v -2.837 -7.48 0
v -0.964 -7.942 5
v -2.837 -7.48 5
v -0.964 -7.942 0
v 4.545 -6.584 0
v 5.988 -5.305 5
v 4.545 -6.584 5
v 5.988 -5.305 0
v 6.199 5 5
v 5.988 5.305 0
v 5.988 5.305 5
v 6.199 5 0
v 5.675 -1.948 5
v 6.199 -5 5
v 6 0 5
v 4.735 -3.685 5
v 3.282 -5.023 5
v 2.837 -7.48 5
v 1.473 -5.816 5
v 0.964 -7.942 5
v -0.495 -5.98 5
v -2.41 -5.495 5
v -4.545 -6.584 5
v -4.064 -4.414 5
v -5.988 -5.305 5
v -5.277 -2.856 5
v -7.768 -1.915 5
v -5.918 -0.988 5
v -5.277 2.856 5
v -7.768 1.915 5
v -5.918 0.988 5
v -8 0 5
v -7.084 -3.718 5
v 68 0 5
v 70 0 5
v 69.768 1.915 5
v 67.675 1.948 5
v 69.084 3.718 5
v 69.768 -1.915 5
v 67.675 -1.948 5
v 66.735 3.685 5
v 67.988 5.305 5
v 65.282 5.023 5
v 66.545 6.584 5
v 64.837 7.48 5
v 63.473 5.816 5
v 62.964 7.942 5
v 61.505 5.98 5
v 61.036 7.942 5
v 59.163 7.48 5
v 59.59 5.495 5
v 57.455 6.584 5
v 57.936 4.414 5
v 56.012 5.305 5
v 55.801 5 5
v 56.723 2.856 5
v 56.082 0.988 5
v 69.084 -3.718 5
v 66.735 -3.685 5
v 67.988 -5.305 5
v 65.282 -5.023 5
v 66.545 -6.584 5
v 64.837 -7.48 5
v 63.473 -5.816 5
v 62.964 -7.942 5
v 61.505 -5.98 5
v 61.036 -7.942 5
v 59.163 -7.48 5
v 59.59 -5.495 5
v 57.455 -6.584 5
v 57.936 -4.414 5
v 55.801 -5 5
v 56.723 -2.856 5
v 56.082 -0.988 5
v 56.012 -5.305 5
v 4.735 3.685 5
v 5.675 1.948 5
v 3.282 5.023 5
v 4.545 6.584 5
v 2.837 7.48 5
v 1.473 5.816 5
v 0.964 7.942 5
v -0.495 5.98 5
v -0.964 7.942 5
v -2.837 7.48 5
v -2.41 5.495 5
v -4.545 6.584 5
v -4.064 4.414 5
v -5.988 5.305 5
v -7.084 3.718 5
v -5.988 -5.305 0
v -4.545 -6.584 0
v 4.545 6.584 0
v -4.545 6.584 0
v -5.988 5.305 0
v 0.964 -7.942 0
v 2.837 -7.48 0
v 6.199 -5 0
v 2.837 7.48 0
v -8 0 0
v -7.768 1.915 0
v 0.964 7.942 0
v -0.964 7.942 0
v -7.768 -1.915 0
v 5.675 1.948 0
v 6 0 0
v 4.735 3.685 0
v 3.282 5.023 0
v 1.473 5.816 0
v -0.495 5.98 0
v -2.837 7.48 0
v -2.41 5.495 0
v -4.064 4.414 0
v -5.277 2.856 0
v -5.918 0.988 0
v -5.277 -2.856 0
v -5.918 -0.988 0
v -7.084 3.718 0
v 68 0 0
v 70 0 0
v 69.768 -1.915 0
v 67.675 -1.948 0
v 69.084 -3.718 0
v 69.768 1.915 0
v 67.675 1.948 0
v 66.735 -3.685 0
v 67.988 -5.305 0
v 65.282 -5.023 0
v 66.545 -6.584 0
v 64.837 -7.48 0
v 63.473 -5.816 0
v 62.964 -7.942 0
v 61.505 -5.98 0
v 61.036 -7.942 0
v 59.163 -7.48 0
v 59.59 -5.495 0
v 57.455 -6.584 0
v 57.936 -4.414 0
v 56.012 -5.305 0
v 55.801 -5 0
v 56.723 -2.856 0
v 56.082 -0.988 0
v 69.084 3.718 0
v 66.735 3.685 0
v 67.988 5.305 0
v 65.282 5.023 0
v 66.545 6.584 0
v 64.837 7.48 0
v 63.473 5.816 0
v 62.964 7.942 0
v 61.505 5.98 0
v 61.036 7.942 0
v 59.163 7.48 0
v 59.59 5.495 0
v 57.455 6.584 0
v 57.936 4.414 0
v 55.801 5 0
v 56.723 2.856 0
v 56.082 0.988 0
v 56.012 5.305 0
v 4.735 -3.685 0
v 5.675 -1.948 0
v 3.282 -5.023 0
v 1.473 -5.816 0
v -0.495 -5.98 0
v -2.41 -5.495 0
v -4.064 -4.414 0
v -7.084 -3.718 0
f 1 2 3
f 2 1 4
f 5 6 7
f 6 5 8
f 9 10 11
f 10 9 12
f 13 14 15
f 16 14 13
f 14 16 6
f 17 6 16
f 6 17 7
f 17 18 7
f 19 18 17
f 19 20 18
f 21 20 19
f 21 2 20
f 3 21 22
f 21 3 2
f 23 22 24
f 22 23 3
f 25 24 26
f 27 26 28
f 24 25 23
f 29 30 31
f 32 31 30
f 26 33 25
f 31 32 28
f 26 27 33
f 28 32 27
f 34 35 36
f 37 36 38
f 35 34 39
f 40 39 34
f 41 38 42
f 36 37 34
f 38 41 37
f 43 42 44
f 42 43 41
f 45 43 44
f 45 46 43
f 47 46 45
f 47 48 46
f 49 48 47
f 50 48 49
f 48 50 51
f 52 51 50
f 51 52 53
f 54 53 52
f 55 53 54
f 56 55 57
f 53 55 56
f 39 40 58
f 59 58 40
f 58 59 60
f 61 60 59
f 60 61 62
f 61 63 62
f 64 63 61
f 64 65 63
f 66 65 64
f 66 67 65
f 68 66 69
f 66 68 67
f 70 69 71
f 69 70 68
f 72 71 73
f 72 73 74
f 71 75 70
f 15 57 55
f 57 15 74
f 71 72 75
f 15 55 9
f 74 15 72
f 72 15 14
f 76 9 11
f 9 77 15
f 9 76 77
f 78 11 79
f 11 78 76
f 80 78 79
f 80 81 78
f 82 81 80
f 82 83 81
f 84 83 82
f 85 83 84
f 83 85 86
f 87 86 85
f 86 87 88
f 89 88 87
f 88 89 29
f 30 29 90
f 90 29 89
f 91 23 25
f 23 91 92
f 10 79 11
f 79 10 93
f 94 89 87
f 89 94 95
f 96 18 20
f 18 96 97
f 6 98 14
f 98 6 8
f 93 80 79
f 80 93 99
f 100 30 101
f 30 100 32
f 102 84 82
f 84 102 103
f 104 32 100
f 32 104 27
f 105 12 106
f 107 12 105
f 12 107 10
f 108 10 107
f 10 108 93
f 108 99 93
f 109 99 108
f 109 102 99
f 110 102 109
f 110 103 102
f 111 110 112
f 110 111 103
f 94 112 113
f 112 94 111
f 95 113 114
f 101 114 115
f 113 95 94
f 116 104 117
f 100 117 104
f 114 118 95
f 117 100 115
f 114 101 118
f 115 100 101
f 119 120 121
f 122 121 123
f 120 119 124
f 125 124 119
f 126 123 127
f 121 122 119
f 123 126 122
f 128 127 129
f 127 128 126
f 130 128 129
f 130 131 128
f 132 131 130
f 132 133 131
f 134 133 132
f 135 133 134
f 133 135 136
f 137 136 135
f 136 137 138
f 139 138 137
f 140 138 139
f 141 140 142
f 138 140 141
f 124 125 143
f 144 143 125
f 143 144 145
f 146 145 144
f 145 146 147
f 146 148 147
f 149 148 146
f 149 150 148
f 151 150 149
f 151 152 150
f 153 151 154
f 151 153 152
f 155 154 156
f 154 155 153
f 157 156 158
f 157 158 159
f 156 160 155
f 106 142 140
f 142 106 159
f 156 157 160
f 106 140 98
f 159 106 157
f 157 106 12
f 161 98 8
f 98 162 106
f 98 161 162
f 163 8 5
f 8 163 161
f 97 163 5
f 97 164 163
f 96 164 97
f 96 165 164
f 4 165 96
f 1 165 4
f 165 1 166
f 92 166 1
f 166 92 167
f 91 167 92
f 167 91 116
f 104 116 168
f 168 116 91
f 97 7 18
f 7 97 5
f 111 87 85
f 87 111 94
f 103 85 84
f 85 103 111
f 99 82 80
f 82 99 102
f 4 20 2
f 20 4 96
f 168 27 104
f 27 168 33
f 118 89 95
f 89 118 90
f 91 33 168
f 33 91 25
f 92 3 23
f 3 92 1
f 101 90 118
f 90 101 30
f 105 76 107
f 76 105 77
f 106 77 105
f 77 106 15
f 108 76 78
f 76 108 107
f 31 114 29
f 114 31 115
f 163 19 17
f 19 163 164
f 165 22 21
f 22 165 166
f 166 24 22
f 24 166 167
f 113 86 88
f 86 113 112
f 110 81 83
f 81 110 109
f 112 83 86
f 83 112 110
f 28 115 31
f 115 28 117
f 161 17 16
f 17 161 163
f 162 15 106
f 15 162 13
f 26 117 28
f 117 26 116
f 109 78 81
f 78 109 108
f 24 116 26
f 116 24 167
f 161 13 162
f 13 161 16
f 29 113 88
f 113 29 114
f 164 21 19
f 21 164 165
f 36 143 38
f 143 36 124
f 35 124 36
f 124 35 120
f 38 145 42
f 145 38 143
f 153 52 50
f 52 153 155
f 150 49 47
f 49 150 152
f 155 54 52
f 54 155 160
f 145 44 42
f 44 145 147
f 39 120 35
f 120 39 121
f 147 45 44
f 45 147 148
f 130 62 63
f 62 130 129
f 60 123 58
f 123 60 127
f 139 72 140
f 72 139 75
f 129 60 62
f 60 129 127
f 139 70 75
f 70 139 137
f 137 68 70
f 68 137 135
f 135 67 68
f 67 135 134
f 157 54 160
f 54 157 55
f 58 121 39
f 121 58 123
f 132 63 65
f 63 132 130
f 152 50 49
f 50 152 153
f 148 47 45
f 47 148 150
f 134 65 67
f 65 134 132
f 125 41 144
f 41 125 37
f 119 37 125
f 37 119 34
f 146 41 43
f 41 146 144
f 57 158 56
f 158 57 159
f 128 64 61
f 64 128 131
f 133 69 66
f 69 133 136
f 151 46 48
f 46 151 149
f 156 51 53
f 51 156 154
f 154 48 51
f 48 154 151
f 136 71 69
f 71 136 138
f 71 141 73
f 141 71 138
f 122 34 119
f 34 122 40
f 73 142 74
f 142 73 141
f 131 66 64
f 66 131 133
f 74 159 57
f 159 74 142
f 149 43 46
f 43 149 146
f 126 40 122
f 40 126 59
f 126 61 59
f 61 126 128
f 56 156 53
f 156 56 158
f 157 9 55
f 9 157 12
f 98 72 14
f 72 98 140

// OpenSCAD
length = 50; // min/max:[5:100]

union(){
difference(){
    cylinder(5,8,8);
    translate([0,0,-1]) cylinder(7,6,6);
}
translate([6,-5,0]) cube([length,10,5]);
difference(){
    translate([length+12,0,0]) cylinder(5,8,8);
    translate([length+12,0,-1]) cylinder(7,6,6);
}
}
